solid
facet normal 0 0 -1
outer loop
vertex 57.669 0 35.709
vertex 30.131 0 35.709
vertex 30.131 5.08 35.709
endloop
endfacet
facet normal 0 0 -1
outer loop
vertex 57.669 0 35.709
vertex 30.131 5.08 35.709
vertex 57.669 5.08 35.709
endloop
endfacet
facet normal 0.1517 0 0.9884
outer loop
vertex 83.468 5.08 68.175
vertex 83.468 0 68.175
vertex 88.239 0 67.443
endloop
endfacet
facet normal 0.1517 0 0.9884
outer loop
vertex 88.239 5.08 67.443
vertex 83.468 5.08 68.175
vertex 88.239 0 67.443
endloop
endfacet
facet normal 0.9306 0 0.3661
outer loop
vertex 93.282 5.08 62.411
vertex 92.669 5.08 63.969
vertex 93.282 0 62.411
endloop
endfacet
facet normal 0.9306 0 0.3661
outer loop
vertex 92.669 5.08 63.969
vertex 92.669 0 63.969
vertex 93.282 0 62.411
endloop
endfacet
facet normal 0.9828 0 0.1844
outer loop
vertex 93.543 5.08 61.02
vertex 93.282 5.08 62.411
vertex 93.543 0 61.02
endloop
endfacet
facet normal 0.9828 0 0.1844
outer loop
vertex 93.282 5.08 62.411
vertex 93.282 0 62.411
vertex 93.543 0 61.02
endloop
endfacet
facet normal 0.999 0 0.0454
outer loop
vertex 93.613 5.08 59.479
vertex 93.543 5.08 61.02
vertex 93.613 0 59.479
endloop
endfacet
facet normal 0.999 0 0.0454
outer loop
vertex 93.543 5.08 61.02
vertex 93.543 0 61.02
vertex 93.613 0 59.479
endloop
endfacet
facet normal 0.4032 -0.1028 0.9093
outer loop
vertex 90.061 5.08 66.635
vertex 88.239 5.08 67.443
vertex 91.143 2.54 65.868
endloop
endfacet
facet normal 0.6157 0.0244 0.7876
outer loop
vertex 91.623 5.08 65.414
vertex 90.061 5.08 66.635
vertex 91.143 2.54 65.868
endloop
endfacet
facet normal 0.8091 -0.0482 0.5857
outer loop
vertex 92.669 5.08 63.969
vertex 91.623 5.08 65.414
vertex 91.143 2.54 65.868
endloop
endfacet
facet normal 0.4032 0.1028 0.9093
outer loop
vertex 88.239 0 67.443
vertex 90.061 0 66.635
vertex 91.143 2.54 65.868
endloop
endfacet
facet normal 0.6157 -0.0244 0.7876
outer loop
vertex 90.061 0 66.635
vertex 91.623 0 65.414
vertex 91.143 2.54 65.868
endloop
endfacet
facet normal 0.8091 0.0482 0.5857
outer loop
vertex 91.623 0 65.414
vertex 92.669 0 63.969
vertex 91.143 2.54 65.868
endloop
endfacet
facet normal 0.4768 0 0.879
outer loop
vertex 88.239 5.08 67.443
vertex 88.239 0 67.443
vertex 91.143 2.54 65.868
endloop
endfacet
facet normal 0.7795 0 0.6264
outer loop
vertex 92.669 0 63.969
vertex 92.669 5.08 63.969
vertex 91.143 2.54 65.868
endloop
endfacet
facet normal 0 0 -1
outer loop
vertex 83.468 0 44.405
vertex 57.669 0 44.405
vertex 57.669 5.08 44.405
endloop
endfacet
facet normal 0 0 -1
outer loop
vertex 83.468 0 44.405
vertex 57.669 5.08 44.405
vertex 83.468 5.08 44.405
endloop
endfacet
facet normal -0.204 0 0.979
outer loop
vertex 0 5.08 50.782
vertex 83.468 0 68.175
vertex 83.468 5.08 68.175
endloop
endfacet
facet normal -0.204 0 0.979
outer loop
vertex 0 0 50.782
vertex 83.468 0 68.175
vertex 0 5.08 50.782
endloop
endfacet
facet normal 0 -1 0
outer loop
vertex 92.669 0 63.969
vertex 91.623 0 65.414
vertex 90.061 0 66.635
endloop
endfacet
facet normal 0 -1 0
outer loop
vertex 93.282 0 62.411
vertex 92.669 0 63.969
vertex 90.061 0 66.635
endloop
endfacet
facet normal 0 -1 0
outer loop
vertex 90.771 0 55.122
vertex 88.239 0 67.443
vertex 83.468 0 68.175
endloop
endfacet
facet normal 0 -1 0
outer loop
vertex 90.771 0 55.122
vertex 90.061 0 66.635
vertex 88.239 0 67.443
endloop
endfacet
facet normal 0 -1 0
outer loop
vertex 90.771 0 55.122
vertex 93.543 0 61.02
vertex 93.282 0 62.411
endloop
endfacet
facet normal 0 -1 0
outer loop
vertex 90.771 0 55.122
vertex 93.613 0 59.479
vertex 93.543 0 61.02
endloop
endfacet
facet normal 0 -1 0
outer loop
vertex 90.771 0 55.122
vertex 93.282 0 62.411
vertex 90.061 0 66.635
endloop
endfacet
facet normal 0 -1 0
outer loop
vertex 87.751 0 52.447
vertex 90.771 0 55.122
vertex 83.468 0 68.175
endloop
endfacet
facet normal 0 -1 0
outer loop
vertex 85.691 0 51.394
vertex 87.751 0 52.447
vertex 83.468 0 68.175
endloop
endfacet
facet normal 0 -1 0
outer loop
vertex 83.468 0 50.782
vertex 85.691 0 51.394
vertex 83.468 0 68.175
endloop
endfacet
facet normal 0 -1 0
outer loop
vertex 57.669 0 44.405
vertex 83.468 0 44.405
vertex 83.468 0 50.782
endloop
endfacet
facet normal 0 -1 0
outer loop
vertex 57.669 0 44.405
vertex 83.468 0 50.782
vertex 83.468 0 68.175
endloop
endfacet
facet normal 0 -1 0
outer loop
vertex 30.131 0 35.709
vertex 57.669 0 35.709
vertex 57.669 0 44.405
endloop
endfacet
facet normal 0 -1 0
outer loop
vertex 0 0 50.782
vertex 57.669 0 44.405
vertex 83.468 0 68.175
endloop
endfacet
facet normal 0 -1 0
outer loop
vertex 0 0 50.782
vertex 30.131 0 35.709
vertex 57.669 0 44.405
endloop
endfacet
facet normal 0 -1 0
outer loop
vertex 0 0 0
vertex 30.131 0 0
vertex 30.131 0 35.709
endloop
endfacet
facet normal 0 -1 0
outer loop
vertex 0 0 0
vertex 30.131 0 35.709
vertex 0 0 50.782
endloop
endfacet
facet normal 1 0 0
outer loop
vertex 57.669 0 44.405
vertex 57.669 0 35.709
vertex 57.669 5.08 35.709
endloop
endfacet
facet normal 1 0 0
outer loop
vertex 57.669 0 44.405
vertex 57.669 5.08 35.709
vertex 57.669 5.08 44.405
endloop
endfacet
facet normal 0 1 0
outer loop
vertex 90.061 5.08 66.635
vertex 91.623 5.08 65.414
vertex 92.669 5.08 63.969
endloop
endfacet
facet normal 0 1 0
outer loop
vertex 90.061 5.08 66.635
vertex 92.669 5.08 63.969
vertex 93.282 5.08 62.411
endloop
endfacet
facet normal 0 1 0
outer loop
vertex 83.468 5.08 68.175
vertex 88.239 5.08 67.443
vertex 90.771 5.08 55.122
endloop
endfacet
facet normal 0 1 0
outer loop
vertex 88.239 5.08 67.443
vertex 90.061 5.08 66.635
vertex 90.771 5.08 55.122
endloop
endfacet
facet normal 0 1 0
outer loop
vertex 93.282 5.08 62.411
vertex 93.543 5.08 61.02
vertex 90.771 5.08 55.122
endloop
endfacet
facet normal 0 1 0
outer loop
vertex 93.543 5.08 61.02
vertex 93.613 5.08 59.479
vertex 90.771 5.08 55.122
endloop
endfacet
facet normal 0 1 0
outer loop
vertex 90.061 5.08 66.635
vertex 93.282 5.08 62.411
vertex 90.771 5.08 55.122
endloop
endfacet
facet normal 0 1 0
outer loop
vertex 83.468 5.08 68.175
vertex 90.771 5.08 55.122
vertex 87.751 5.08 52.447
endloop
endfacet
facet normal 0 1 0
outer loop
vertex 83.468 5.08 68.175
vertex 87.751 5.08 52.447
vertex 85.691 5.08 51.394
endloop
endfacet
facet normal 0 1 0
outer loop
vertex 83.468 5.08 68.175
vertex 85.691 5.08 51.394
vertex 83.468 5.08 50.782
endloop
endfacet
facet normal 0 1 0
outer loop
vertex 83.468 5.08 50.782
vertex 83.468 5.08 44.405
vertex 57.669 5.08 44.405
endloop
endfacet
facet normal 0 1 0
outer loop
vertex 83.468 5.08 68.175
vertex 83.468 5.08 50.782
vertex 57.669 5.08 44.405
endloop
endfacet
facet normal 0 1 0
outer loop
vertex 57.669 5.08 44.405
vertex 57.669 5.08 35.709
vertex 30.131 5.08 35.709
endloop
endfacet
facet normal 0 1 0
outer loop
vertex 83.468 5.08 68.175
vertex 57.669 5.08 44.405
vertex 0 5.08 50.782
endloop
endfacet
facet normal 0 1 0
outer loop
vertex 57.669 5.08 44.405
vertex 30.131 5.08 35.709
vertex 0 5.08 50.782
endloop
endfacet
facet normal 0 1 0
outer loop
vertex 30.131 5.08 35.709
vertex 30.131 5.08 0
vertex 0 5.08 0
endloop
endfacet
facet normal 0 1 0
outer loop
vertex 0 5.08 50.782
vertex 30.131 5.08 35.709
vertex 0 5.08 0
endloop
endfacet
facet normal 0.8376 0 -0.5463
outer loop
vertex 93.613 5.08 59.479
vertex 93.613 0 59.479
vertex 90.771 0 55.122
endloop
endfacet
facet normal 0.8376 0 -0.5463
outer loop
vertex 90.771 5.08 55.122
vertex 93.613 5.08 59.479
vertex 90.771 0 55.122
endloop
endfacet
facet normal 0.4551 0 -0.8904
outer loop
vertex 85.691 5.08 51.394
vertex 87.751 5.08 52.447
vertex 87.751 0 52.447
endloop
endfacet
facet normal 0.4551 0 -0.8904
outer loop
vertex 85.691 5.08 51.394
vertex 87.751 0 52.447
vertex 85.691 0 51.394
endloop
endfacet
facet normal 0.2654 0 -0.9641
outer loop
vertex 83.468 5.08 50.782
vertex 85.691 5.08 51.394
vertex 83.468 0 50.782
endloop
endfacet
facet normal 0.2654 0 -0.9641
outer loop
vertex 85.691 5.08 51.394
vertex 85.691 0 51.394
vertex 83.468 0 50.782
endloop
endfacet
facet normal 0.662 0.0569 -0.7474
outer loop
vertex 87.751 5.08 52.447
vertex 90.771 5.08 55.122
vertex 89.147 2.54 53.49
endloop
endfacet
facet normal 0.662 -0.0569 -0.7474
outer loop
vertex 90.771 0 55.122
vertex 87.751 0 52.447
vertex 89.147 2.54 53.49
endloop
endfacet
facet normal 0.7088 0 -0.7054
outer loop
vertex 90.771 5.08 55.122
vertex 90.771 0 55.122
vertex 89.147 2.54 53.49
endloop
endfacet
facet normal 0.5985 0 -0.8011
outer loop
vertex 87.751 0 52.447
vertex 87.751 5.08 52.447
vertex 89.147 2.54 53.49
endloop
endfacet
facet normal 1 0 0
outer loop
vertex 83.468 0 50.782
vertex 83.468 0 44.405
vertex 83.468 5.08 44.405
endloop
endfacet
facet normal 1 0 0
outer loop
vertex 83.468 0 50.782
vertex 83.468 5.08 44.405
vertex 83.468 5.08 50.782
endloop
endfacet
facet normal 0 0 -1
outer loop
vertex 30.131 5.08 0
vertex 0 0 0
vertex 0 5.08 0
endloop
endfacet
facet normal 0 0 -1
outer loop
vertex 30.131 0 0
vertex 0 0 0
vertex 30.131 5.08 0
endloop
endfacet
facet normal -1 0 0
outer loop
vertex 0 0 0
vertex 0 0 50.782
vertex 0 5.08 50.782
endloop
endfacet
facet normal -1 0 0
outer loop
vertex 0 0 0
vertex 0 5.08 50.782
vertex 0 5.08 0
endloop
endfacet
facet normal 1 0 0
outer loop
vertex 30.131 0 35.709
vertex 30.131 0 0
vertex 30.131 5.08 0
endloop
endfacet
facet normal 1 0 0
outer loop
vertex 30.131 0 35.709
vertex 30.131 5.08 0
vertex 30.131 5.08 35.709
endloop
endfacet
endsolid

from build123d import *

# Parameters (mm, degrees)
BOSS_EXTRUDE2_DEPTH = 5.08


with BuildPart() as part:
    # Sketch2 → Boss-Extrude2 (new body)
    with BuildSketch(Plane(origin=(0, 0, 0), x_dir=(1, 0, 0), z_dir=(0, 1, 0))):
        with BuildLine():
            Line((0, 0), (30.130673801, 0))
            Line((30.130673801, 0), (30.130673801, -29.621601631))
            Line((30.130673801, -29.621601631), (30.130673801, -35.708970709))
            Line((30.130673801, -35.708970709), (57.668772007, -35.708970709))
            Line((57.668772007, -35.708970709), (57.668772007, -44.405212247))
            Line((57.668772007, -44.405212247), (83.467621906, -44.405212247))
            Line((83.467621906, -44.405212247), (83.467621906, -50.782456043))
            add(Edge.make_bspline(
                [(93.613237035, -59.478697582), (89.75401012, -51.849955928), (83.467621906, -50.782456043)],
                knots=[0, 0, 0, 0.754491666, 0.754491666, 0.754491666], degree=2))
            add(Edge.make_bspline(
                [(83.467621906, -68.17493912), (93.746562006, -67.908588045), (93.613237035, -59.478697582)],
                knots=[0, 0, 0, 1, 1, 1], degree=2))
            Line((83.467621906, -68.17493912), (0, -50.782456043))
            Line((0, -50.782456043), (0, 0))
        make_face()
    extrude(amount=BOSS_EXTRUDE2_DEPTH)


solid = part.part
